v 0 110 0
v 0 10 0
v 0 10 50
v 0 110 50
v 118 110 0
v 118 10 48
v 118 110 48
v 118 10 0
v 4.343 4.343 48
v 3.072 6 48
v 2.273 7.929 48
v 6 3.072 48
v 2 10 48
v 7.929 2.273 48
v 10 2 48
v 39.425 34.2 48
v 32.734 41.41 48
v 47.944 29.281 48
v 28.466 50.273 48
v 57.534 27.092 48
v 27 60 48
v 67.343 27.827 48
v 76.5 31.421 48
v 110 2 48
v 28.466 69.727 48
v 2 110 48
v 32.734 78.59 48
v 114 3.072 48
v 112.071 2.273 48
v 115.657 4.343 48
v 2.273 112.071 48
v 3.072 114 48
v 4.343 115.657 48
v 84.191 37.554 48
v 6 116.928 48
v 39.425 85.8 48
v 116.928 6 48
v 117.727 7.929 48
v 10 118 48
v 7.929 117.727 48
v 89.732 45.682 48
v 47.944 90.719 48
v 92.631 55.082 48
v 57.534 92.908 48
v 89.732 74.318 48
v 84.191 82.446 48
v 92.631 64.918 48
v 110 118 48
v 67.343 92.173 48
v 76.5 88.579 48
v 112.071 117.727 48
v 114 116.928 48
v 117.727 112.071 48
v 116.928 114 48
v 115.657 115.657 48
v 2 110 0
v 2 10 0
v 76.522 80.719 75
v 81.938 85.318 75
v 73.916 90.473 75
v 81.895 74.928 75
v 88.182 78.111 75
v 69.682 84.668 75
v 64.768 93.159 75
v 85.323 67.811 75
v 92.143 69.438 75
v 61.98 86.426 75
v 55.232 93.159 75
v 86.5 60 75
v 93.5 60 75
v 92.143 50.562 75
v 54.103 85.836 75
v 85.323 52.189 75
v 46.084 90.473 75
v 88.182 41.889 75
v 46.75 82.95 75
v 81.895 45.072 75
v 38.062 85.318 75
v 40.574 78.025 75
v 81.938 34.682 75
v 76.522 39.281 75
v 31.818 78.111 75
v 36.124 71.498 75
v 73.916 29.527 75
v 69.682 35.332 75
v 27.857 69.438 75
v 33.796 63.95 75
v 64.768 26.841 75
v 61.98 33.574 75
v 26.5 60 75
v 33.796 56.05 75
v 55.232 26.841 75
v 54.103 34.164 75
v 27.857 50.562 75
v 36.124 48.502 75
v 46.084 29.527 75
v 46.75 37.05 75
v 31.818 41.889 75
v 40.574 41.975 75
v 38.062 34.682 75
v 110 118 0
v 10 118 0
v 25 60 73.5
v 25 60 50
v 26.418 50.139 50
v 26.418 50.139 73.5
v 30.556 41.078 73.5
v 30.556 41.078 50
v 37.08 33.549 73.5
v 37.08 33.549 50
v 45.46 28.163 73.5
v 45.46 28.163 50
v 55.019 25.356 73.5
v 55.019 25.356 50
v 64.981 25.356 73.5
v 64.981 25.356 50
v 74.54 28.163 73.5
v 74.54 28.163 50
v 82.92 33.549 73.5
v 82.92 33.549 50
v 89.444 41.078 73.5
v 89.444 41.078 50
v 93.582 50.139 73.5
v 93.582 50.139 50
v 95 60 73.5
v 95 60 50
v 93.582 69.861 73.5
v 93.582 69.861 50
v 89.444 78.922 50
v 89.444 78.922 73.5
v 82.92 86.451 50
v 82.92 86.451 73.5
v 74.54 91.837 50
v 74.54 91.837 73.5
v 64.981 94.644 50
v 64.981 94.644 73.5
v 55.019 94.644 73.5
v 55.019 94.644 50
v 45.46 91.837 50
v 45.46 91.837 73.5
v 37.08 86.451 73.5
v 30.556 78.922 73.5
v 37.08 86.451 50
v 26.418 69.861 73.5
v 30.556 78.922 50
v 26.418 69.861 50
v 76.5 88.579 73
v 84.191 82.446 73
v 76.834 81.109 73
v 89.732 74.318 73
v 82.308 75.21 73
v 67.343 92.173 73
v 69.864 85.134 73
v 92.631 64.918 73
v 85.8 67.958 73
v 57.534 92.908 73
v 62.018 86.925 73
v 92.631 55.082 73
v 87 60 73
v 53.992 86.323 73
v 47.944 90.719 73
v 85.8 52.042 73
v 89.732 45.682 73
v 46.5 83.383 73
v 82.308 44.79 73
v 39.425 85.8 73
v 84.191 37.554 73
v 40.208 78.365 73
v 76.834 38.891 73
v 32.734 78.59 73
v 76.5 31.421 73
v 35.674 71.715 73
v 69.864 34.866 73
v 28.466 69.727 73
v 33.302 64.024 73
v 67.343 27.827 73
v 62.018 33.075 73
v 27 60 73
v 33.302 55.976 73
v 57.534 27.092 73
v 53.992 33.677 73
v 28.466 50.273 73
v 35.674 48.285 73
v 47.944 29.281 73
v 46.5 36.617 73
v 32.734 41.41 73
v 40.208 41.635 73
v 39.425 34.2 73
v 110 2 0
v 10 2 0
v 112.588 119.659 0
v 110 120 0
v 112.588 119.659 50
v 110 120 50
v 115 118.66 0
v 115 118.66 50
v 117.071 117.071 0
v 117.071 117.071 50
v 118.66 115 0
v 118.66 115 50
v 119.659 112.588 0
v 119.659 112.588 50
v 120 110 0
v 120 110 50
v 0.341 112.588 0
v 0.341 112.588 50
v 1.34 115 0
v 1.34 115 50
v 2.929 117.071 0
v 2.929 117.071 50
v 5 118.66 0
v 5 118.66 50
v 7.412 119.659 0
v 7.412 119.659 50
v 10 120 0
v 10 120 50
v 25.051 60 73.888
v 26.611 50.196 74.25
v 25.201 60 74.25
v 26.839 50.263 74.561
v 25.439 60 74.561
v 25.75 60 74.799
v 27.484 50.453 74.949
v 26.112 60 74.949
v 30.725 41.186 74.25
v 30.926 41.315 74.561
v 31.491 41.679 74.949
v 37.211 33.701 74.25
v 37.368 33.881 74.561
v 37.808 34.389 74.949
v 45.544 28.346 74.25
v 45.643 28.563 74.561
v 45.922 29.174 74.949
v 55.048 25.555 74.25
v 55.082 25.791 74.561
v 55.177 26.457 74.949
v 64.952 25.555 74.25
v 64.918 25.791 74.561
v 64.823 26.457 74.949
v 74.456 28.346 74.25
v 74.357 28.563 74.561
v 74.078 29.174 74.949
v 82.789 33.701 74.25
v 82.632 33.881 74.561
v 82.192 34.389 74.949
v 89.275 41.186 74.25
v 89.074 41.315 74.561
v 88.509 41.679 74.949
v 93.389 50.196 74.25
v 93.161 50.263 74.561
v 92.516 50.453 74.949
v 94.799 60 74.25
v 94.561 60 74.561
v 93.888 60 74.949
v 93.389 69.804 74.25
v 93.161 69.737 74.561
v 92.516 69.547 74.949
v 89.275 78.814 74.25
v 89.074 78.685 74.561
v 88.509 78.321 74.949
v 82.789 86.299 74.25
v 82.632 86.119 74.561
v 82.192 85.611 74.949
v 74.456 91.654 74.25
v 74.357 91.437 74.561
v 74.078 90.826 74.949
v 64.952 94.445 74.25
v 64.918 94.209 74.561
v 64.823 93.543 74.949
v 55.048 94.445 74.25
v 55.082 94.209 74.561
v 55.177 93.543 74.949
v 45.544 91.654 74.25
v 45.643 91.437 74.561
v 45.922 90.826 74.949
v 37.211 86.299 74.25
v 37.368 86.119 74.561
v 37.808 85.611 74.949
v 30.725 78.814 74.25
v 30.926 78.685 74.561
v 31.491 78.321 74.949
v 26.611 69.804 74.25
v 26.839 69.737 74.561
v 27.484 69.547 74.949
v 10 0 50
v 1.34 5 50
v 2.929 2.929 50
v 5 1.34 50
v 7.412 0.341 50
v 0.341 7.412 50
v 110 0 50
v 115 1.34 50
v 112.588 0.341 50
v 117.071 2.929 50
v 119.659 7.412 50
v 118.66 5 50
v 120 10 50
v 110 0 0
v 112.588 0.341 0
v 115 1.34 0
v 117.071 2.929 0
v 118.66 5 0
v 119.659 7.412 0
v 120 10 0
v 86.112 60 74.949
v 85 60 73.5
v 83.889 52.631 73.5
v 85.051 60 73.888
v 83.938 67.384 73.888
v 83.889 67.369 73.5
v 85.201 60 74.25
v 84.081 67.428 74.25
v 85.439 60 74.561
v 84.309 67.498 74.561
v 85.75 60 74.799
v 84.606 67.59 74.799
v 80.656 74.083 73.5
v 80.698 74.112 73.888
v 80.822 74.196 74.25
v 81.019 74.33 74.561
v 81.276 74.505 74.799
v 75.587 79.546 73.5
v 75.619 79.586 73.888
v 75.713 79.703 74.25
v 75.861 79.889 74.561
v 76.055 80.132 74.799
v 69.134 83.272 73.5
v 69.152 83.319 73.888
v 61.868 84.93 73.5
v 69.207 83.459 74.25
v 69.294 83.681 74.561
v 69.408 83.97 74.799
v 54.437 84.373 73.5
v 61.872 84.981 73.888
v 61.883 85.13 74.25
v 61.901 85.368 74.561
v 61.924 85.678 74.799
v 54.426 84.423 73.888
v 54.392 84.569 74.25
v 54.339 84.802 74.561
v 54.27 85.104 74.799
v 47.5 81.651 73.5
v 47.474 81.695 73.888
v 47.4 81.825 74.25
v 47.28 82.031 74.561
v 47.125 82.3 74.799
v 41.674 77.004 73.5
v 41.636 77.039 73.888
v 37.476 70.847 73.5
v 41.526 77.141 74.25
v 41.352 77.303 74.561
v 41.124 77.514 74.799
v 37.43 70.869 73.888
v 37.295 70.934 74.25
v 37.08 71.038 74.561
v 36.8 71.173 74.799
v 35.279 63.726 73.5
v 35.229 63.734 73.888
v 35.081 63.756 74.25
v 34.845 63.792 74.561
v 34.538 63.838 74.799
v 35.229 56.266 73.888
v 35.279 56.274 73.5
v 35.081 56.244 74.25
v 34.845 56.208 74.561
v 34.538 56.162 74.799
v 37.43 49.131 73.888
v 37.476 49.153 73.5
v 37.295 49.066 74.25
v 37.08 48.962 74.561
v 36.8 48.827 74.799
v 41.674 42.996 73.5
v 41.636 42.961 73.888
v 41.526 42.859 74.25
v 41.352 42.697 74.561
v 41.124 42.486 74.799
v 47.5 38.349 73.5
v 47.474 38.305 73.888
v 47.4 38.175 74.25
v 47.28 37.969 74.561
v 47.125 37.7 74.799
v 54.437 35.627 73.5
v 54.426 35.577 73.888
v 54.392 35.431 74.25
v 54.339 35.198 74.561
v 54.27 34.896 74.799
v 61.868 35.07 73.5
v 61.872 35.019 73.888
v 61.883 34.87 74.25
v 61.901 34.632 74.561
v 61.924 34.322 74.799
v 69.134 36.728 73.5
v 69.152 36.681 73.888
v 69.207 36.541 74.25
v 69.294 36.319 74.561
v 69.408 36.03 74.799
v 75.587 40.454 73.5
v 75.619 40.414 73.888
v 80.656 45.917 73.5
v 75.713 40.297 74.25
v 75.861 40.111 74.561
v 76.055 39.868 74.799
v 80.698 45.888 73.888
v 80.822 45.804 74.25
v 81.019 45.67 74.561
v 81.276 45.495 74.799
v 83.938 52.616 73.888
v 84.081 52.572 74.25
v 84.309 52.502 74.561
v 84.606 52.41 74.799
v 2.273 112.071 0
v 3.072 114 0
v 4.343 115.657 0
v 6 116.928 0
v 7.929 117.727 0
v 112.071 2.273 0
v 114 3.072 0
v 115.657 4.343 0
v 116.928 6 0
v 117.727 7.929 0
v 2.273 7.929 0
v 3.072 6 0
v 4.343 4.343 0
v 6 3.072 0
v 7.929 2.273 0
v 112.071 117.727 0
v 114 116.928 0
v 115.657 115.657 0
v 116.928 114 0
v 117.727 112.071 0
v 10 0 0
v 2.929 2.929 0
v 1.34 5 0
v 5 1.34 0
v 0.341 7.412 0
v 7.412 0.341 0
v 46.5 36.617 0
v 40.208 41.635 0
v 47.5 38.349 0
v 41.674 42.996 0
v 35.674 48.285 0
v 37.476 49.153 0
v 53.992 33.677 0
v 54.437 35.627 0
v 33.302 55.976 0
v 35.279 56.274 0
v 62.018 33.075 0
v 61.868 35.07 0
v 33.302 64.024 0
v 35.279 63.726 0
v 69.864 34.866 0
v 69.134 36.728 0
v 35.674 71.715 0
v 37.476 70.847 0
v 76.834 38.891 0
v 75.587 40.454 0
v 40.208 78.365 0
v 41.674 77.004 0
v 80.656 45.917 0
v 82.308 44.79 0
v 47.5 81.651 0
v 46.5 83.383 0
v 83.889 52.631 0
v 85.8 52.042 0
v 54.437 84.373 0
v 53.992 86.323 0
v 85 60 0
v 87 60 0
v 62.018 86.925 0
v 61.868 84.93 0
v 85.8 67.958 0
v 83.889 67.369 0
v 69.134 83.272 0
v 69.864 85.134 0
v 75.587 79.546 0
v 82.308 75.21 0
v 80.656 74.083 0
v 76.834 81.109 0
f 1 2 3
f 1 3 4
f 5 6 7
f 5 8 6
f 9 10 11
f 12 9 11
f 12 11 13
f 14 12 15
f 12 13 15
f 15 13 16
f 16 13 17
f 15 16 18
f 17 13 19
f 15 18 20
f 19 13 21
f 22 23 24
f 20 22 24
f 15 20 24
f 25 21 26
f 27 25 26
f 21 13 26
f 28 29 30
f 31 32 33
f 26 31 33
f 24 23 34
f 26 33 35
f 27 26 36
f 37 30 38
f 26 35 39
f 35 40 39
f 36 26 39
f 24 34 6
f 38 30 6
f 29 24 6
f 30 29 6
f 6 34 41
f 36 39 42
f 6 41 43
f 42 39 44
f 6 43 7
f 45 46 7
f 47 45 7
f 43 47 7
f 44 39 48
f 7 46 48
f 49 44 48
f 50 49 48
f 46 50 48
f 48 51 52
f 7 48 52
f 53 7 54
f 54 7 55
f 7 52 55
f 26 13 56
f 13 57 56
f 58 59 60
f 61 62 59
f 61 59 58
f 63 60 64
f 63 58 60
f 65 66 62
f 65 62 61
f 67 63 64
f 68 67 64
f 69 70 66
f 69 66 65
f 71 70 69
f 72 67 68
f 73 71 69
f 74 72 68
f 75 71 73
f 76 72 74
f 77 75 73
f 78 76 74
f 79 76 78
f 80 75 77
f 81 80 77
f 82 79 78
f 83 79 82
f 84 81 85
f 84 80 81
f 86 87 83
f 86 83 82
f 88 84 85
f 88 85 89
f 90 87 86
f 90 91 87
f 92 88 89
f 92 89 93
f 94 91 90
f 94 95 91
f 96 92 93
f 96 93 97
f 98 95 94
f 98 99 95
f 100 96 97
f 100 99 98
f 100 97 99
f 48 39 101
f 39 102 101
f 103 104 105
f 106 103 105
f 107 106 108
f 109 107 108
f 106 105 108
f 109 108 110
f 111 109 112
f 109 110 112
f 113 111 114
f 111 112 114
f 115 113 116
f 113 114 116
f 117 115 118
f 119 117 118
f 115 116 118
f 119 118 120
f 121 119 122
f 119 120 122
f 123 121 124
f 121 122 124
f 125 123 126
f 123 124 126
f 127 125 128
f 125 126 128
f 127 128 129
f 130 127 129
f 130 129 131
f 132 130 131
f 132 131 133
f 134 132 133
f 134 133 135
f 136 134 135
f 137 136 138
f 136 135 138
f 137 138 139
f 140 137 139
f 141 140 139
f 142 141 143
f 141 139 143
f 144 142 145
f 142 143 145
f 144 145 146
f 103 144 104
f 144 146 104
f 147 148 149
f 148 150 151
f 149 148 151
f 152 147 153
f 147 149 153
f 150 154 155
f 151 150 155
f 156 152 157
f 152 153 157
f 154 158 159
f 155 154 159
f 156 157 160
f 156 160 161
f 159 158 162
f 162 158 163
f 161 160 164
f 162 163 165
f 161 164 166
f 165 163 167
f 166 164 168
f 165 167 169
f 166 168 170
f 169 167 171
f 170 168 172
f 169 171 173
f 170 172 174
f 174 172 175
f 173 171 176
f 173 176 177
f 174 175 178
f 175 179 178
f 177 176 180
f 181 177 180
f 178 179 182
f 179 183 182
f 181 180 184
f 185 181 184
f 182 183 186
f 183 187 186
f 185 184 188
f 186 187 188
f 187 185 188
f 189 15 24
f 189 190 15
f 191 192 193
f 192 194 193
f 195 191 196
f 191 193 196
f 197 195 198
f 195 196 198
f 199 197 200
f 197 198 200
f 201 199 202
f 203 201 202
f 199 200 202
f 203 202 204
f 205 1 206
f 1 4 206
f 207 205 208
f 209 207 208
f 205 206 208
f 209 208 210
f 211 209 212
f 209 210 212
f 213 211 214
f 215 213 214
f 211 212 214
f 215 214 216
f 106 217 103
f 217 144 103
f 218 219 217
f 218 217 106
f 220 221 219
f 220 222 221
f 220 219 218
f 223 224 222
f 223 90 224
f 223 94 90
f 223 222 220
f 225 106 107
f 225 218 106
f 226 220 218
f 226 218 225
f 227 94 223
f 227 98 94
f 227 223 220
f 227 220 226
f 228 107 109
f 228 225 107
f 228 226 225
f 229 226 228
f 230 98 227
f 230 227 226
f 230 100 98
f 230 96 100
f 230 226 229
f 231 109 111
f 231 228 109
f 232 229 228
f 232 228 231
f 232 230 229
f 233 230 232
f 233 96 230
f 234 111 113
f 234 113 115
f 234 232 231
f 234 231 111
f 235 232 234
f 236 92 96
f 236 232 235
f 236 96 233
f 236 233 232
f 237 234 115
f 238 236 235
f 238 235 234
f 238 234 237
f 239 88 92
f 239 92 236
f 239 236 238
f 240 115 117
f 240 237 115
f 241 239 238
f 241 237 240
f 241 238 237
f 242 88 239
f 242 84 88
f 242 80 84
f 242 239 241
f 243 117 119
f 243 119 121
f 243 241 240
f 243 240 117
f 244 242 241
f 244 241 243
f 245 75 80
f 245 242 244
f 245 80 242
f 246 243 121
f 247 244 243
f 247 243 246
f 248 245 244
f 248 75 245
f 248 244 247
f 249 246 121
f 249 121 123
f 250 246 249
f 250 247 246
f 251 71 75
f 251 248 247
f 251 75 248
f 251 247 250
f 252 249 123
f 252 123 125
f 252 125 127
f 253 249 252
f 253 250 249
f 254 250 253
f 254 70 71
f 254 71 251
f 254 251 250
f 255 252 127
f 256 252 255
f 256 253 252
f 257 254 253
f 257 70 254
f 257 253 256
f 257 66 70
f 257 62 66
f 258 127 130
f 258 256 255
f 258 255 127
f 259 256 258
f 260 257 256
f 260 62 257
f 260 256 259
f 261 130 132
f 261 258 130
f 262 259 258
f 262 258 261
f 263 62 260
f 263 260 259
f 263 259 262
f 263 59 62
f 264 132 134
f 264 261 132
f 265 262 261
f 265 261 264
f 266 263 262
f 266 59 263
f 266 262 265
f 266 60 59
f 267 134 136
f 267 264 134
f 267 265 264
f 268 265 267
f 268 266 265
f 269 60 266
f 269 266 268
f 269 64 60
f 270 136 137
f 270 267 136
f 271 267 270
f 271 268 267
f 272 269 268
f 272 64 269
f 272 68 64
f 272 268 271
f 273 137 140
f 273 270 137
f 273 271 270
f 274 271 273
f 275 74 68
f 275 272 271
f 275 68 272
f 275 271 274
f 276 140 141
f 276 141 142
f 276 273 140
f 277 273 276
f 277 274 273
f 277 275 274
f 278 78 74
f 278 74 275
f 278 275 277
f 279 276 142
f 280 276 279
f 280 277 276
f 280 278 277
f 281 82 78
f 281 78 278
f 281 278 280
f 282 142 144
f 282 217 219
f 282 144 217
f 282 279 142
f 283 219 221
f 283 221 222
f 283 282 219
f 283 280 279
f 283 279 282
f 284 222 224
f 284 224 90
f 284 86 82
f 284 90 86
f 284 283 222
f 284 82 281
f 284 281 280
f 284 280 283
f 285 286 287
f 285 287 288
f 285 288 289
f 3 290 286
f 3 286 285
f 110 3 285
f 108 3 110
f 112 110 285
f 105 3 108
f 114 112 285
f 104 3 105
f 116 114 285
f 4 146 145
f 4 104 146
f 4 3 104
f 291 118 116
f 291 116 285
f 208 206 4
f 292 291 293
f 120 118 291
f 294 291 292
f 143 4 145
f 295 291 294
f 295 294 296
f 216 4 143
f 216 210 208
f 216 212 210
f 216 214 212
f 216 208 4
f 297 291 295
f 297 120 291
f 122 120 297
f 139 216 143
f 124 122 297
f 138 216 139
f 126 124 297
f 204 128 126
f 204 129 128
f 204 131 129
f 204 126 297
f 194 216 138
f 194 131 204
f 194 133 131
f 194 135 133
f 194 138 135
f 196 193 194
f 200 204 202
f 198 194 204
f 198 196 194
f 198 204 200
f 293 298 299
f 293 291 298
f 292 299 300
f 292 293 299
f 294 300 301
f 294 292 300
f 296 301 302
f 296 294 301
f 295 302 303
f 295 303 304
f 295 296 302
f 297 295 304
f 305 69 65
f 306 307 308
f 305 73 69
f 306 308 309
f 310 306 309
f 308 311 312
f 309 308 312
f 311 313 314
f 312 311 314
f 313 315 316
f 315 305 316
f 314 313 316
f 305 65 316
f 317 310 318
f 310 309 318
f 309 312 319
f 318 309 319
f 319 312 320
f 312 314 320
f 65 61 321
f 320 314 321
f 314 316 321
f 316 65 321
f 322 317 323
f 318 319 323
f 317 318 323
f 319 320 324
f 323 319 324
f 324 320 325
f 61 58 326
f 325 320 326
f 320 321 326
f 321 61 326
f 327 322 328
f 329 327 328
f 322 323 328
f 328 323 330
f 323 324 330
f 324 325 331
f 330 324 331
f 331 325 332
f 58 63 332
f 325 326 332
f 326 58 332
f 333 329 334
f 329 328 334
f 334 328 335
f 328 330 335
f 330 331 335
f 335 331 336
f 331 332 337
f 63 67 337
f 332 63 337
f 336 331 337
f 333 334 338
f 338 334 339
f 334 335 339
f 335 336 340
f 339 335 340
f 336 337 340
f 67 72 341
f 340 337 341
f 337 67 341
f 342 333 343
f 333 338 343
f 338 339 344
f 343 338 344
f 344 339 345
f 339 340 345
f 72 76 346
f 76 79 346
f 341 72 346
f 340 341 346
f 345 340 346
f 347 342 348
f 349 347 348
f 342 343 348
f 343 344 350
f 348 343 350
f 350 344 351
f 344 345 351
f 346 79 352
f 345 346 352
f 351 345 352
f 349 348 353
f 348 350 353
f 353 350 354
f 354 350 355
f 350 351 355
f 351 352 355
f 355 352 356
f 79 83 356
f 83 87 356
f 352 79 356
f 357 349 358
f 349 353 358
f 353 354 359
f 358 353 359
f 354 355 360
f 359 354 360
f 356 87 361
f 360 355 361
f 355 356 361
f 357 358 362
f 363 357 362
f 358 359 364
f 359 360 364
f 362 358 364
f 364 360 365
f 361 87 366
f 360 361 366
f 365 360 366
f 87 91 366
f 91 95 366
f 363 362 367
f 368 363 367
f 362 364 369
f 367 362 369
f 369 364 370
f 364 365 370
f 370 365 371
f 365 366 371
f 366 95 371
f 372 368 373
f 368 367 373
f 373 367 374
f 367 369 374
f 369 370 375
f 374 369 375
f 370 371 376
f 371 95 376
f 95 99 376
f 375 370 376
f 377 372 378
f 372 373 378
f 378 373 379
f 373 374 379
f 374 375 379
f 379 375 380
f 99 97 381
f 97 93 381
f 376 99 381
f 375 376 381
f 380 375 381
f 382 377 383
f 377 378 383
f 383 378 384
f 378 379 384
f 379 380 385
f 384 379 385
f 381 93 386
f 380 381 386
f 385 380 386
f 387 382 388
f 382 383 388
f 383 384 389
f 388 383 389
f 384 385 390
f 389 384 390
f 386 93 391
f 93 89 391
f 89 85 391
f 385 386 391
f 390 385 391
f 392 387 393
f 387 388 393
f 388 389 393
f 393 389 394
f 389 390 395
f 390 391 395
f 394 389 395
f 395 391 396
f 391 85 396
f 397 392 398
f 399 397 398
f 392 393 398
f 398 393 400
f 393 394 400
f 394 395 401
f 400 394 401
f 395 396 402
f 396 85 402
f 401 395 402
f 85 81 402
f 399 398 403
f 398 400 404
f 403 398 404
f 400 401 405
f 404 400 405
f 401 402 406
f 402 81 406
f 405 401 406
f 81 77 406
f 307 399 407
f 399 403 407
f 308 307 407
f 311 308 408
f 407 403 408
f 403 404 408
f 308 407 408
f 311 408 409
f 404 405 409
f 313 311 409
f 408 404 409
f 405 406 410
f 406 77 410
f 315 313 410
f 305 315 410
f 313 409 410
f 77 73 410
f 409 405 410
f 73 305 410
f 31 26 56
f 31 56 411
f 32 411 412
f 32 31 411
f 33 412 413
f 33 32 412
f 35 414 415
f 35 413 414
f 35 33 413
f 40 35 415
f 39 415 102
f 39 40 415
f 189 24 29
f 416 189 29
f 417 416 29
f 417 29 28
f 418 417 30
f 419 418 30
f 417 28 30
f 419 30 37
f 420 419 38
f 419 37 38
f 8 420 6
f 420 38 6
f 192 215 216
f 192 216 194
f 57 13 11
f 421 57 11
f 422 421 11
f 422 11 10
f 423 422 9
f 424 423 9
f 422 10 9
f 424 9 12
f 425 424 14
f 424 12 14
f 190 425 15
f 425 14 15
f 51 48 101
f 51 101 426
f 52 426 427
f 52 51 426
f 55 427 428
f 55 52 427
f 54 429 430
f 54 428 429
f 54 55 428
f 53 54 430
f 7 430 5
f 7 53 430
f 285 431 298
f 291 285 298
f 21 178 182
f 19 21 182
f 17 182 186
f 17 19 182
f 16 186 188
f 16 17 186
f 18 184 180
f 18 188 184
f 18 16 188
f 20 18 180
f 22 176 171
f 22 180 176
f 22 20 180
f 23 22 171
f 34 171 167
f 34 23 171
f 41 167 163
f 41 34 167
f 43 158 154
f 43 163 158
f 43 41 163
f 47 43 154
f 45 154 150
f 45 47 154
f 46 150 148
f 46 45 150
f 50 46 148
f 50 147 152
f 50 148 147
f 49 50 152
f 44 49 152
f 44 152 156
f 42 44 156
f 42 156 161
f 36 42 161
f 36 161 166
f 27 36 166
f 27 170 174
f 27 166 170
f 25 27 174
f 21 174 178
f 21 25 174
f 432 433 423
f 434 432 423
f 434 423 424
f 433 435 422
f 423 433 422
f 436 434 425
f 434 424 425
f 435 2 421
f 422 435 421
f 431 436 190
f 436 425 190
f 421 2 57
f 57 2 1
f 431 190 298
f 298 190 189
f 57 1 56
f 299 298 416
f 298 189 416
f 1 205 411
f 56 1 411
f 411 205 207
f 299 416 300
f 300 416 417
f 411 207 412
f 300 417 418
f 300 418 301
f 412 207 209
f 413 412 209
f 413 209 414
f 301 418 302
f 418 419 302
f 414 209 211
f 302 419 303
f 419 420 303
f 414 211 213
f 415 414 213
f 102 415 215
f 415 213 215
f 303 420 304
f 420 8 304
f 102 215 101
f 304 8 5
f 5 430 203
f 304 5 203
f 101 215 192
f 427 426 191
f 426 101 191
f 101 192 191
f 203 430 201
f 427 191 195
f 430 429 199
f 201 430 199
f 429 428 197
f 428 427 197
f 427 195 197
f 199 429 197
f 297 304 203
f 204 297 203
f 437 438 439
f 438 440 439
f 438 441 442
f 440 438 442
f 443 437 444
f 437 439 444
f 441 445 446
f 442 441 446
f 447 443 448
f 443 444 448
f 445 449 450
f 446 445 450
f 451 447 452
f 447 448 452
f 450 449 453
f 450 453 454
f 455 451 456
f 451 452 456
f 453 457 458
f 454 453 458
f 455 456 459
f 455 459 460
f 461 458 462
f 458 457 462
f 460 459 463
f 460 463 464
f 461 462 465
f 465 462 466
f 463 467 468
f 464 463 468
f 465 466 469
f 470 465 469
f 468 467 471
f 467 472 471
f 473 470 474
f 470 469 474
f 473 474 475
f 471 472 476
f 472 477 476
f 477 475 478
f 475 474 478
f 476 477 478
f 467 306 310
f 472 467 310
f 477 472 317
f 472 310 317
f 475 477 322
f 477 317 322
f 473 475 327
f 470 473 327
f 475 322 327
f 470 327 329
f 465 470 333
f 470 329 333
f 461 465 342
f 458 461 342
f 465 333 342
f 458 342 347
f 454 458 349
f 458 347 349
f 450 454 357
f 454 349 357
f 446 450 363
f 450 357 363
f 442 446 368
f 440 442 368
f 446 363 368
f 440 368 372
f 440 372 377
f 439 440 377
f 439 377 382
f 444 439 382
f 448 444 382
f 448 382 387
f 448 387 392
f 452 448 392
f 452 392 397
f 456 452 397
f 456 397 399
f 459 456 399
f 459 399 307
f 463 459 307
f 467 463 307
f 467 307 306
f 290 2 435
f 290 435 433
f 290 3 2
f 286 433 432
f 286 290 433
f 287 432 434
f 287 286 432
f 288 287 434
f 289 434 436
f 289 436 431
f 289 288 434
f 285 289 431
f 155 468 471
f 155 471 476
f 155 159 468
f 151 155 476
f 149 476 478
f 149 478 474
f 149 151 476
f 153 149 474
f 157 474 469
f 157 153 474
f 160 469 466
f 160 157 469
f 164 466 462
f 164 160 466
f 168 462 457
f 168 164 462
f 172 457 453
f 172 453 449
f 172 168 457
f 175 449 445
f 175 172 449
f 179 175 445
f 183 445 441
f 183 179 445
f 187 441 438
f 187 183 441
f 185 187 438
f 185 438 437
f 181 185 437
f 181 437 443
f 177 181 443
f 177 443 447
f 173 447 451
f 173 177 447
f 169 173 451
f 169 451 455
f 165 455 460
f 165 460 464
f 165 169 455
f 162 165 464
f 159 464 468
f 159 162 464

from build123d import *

# Parameters (mm, degrees)
SKETCH1_W           = 120
SKETCH1_H           = 120
BOSS_EXTRUDE1_DEPTH = 50
SKETCH2_R           = 35
BOSS_EXTRUDE2_DEPTH = 25
SKETCH3_R           = 25
CUT_EXTRUDE1_DEPTH  = 186.539753153
FILLET1_R           = 10
FILLET2_R           = 1.5
SHELL1_T            = -2


with BuildPart() as part:
    # Sketch1 → Boss-Extrude1 (new body)
    with BuildSketch(Plane.XY):
        with Locations((60, 60)):
            Rectangle(SKETCH1_W, SKETCH1_H)
    extrude(amount=BOSS_EXTRUDE1_DEPTH)

    # Sketch2 → Boss-Extrude2 (add)
    with BuildSketch(Plane.XY.offset(50)):
        with Locations(Location((60, 60, 0), (0, 0, 180))):
            Circle(SKETCH2_R)
    extrude(amount=BOSS_EXTRUDE2_DEPTH)

    # Sketch3 → Cut-Extrude1 (cut, through all)
    with BuildSketch(Plane.XY.offset(75)):
        with Locations((60, 60)):
            Circle(SKETCH3_R)
    extrude(amount=-CUT_EXTRUDE1_DEPTH, mode=Mode.SUBTRACT)

    # Fillet1
    fillet1_edges = [part.edges().sort_by_distance(p)[0] for p in [
        (0, 120, 25),
        (120, 120, 25),
        (120, 0, 25),
        (0, 0, 25),
    ]]
    fillet(fillet1_edges, radius=FILLET1_R)

    # Fillet2
    fillet2_edges = [part.edges().sort_by_distance(p)[0] for p in [
        (95, 60, 75),
        (35, 60, 75),
    ]]
    fillet(fillet2_edges, radius=FILLET2_R)

    # Shell1
    shell1_openings = [part.faces().sort_by_distance(p)[0] for p in [
        (60, 1.697056275, 0),
    ]]
    offset(amount=SHELL1_T, openings=shell1_openings, kind=Kind.INTERSECTION)


solid = part.part
